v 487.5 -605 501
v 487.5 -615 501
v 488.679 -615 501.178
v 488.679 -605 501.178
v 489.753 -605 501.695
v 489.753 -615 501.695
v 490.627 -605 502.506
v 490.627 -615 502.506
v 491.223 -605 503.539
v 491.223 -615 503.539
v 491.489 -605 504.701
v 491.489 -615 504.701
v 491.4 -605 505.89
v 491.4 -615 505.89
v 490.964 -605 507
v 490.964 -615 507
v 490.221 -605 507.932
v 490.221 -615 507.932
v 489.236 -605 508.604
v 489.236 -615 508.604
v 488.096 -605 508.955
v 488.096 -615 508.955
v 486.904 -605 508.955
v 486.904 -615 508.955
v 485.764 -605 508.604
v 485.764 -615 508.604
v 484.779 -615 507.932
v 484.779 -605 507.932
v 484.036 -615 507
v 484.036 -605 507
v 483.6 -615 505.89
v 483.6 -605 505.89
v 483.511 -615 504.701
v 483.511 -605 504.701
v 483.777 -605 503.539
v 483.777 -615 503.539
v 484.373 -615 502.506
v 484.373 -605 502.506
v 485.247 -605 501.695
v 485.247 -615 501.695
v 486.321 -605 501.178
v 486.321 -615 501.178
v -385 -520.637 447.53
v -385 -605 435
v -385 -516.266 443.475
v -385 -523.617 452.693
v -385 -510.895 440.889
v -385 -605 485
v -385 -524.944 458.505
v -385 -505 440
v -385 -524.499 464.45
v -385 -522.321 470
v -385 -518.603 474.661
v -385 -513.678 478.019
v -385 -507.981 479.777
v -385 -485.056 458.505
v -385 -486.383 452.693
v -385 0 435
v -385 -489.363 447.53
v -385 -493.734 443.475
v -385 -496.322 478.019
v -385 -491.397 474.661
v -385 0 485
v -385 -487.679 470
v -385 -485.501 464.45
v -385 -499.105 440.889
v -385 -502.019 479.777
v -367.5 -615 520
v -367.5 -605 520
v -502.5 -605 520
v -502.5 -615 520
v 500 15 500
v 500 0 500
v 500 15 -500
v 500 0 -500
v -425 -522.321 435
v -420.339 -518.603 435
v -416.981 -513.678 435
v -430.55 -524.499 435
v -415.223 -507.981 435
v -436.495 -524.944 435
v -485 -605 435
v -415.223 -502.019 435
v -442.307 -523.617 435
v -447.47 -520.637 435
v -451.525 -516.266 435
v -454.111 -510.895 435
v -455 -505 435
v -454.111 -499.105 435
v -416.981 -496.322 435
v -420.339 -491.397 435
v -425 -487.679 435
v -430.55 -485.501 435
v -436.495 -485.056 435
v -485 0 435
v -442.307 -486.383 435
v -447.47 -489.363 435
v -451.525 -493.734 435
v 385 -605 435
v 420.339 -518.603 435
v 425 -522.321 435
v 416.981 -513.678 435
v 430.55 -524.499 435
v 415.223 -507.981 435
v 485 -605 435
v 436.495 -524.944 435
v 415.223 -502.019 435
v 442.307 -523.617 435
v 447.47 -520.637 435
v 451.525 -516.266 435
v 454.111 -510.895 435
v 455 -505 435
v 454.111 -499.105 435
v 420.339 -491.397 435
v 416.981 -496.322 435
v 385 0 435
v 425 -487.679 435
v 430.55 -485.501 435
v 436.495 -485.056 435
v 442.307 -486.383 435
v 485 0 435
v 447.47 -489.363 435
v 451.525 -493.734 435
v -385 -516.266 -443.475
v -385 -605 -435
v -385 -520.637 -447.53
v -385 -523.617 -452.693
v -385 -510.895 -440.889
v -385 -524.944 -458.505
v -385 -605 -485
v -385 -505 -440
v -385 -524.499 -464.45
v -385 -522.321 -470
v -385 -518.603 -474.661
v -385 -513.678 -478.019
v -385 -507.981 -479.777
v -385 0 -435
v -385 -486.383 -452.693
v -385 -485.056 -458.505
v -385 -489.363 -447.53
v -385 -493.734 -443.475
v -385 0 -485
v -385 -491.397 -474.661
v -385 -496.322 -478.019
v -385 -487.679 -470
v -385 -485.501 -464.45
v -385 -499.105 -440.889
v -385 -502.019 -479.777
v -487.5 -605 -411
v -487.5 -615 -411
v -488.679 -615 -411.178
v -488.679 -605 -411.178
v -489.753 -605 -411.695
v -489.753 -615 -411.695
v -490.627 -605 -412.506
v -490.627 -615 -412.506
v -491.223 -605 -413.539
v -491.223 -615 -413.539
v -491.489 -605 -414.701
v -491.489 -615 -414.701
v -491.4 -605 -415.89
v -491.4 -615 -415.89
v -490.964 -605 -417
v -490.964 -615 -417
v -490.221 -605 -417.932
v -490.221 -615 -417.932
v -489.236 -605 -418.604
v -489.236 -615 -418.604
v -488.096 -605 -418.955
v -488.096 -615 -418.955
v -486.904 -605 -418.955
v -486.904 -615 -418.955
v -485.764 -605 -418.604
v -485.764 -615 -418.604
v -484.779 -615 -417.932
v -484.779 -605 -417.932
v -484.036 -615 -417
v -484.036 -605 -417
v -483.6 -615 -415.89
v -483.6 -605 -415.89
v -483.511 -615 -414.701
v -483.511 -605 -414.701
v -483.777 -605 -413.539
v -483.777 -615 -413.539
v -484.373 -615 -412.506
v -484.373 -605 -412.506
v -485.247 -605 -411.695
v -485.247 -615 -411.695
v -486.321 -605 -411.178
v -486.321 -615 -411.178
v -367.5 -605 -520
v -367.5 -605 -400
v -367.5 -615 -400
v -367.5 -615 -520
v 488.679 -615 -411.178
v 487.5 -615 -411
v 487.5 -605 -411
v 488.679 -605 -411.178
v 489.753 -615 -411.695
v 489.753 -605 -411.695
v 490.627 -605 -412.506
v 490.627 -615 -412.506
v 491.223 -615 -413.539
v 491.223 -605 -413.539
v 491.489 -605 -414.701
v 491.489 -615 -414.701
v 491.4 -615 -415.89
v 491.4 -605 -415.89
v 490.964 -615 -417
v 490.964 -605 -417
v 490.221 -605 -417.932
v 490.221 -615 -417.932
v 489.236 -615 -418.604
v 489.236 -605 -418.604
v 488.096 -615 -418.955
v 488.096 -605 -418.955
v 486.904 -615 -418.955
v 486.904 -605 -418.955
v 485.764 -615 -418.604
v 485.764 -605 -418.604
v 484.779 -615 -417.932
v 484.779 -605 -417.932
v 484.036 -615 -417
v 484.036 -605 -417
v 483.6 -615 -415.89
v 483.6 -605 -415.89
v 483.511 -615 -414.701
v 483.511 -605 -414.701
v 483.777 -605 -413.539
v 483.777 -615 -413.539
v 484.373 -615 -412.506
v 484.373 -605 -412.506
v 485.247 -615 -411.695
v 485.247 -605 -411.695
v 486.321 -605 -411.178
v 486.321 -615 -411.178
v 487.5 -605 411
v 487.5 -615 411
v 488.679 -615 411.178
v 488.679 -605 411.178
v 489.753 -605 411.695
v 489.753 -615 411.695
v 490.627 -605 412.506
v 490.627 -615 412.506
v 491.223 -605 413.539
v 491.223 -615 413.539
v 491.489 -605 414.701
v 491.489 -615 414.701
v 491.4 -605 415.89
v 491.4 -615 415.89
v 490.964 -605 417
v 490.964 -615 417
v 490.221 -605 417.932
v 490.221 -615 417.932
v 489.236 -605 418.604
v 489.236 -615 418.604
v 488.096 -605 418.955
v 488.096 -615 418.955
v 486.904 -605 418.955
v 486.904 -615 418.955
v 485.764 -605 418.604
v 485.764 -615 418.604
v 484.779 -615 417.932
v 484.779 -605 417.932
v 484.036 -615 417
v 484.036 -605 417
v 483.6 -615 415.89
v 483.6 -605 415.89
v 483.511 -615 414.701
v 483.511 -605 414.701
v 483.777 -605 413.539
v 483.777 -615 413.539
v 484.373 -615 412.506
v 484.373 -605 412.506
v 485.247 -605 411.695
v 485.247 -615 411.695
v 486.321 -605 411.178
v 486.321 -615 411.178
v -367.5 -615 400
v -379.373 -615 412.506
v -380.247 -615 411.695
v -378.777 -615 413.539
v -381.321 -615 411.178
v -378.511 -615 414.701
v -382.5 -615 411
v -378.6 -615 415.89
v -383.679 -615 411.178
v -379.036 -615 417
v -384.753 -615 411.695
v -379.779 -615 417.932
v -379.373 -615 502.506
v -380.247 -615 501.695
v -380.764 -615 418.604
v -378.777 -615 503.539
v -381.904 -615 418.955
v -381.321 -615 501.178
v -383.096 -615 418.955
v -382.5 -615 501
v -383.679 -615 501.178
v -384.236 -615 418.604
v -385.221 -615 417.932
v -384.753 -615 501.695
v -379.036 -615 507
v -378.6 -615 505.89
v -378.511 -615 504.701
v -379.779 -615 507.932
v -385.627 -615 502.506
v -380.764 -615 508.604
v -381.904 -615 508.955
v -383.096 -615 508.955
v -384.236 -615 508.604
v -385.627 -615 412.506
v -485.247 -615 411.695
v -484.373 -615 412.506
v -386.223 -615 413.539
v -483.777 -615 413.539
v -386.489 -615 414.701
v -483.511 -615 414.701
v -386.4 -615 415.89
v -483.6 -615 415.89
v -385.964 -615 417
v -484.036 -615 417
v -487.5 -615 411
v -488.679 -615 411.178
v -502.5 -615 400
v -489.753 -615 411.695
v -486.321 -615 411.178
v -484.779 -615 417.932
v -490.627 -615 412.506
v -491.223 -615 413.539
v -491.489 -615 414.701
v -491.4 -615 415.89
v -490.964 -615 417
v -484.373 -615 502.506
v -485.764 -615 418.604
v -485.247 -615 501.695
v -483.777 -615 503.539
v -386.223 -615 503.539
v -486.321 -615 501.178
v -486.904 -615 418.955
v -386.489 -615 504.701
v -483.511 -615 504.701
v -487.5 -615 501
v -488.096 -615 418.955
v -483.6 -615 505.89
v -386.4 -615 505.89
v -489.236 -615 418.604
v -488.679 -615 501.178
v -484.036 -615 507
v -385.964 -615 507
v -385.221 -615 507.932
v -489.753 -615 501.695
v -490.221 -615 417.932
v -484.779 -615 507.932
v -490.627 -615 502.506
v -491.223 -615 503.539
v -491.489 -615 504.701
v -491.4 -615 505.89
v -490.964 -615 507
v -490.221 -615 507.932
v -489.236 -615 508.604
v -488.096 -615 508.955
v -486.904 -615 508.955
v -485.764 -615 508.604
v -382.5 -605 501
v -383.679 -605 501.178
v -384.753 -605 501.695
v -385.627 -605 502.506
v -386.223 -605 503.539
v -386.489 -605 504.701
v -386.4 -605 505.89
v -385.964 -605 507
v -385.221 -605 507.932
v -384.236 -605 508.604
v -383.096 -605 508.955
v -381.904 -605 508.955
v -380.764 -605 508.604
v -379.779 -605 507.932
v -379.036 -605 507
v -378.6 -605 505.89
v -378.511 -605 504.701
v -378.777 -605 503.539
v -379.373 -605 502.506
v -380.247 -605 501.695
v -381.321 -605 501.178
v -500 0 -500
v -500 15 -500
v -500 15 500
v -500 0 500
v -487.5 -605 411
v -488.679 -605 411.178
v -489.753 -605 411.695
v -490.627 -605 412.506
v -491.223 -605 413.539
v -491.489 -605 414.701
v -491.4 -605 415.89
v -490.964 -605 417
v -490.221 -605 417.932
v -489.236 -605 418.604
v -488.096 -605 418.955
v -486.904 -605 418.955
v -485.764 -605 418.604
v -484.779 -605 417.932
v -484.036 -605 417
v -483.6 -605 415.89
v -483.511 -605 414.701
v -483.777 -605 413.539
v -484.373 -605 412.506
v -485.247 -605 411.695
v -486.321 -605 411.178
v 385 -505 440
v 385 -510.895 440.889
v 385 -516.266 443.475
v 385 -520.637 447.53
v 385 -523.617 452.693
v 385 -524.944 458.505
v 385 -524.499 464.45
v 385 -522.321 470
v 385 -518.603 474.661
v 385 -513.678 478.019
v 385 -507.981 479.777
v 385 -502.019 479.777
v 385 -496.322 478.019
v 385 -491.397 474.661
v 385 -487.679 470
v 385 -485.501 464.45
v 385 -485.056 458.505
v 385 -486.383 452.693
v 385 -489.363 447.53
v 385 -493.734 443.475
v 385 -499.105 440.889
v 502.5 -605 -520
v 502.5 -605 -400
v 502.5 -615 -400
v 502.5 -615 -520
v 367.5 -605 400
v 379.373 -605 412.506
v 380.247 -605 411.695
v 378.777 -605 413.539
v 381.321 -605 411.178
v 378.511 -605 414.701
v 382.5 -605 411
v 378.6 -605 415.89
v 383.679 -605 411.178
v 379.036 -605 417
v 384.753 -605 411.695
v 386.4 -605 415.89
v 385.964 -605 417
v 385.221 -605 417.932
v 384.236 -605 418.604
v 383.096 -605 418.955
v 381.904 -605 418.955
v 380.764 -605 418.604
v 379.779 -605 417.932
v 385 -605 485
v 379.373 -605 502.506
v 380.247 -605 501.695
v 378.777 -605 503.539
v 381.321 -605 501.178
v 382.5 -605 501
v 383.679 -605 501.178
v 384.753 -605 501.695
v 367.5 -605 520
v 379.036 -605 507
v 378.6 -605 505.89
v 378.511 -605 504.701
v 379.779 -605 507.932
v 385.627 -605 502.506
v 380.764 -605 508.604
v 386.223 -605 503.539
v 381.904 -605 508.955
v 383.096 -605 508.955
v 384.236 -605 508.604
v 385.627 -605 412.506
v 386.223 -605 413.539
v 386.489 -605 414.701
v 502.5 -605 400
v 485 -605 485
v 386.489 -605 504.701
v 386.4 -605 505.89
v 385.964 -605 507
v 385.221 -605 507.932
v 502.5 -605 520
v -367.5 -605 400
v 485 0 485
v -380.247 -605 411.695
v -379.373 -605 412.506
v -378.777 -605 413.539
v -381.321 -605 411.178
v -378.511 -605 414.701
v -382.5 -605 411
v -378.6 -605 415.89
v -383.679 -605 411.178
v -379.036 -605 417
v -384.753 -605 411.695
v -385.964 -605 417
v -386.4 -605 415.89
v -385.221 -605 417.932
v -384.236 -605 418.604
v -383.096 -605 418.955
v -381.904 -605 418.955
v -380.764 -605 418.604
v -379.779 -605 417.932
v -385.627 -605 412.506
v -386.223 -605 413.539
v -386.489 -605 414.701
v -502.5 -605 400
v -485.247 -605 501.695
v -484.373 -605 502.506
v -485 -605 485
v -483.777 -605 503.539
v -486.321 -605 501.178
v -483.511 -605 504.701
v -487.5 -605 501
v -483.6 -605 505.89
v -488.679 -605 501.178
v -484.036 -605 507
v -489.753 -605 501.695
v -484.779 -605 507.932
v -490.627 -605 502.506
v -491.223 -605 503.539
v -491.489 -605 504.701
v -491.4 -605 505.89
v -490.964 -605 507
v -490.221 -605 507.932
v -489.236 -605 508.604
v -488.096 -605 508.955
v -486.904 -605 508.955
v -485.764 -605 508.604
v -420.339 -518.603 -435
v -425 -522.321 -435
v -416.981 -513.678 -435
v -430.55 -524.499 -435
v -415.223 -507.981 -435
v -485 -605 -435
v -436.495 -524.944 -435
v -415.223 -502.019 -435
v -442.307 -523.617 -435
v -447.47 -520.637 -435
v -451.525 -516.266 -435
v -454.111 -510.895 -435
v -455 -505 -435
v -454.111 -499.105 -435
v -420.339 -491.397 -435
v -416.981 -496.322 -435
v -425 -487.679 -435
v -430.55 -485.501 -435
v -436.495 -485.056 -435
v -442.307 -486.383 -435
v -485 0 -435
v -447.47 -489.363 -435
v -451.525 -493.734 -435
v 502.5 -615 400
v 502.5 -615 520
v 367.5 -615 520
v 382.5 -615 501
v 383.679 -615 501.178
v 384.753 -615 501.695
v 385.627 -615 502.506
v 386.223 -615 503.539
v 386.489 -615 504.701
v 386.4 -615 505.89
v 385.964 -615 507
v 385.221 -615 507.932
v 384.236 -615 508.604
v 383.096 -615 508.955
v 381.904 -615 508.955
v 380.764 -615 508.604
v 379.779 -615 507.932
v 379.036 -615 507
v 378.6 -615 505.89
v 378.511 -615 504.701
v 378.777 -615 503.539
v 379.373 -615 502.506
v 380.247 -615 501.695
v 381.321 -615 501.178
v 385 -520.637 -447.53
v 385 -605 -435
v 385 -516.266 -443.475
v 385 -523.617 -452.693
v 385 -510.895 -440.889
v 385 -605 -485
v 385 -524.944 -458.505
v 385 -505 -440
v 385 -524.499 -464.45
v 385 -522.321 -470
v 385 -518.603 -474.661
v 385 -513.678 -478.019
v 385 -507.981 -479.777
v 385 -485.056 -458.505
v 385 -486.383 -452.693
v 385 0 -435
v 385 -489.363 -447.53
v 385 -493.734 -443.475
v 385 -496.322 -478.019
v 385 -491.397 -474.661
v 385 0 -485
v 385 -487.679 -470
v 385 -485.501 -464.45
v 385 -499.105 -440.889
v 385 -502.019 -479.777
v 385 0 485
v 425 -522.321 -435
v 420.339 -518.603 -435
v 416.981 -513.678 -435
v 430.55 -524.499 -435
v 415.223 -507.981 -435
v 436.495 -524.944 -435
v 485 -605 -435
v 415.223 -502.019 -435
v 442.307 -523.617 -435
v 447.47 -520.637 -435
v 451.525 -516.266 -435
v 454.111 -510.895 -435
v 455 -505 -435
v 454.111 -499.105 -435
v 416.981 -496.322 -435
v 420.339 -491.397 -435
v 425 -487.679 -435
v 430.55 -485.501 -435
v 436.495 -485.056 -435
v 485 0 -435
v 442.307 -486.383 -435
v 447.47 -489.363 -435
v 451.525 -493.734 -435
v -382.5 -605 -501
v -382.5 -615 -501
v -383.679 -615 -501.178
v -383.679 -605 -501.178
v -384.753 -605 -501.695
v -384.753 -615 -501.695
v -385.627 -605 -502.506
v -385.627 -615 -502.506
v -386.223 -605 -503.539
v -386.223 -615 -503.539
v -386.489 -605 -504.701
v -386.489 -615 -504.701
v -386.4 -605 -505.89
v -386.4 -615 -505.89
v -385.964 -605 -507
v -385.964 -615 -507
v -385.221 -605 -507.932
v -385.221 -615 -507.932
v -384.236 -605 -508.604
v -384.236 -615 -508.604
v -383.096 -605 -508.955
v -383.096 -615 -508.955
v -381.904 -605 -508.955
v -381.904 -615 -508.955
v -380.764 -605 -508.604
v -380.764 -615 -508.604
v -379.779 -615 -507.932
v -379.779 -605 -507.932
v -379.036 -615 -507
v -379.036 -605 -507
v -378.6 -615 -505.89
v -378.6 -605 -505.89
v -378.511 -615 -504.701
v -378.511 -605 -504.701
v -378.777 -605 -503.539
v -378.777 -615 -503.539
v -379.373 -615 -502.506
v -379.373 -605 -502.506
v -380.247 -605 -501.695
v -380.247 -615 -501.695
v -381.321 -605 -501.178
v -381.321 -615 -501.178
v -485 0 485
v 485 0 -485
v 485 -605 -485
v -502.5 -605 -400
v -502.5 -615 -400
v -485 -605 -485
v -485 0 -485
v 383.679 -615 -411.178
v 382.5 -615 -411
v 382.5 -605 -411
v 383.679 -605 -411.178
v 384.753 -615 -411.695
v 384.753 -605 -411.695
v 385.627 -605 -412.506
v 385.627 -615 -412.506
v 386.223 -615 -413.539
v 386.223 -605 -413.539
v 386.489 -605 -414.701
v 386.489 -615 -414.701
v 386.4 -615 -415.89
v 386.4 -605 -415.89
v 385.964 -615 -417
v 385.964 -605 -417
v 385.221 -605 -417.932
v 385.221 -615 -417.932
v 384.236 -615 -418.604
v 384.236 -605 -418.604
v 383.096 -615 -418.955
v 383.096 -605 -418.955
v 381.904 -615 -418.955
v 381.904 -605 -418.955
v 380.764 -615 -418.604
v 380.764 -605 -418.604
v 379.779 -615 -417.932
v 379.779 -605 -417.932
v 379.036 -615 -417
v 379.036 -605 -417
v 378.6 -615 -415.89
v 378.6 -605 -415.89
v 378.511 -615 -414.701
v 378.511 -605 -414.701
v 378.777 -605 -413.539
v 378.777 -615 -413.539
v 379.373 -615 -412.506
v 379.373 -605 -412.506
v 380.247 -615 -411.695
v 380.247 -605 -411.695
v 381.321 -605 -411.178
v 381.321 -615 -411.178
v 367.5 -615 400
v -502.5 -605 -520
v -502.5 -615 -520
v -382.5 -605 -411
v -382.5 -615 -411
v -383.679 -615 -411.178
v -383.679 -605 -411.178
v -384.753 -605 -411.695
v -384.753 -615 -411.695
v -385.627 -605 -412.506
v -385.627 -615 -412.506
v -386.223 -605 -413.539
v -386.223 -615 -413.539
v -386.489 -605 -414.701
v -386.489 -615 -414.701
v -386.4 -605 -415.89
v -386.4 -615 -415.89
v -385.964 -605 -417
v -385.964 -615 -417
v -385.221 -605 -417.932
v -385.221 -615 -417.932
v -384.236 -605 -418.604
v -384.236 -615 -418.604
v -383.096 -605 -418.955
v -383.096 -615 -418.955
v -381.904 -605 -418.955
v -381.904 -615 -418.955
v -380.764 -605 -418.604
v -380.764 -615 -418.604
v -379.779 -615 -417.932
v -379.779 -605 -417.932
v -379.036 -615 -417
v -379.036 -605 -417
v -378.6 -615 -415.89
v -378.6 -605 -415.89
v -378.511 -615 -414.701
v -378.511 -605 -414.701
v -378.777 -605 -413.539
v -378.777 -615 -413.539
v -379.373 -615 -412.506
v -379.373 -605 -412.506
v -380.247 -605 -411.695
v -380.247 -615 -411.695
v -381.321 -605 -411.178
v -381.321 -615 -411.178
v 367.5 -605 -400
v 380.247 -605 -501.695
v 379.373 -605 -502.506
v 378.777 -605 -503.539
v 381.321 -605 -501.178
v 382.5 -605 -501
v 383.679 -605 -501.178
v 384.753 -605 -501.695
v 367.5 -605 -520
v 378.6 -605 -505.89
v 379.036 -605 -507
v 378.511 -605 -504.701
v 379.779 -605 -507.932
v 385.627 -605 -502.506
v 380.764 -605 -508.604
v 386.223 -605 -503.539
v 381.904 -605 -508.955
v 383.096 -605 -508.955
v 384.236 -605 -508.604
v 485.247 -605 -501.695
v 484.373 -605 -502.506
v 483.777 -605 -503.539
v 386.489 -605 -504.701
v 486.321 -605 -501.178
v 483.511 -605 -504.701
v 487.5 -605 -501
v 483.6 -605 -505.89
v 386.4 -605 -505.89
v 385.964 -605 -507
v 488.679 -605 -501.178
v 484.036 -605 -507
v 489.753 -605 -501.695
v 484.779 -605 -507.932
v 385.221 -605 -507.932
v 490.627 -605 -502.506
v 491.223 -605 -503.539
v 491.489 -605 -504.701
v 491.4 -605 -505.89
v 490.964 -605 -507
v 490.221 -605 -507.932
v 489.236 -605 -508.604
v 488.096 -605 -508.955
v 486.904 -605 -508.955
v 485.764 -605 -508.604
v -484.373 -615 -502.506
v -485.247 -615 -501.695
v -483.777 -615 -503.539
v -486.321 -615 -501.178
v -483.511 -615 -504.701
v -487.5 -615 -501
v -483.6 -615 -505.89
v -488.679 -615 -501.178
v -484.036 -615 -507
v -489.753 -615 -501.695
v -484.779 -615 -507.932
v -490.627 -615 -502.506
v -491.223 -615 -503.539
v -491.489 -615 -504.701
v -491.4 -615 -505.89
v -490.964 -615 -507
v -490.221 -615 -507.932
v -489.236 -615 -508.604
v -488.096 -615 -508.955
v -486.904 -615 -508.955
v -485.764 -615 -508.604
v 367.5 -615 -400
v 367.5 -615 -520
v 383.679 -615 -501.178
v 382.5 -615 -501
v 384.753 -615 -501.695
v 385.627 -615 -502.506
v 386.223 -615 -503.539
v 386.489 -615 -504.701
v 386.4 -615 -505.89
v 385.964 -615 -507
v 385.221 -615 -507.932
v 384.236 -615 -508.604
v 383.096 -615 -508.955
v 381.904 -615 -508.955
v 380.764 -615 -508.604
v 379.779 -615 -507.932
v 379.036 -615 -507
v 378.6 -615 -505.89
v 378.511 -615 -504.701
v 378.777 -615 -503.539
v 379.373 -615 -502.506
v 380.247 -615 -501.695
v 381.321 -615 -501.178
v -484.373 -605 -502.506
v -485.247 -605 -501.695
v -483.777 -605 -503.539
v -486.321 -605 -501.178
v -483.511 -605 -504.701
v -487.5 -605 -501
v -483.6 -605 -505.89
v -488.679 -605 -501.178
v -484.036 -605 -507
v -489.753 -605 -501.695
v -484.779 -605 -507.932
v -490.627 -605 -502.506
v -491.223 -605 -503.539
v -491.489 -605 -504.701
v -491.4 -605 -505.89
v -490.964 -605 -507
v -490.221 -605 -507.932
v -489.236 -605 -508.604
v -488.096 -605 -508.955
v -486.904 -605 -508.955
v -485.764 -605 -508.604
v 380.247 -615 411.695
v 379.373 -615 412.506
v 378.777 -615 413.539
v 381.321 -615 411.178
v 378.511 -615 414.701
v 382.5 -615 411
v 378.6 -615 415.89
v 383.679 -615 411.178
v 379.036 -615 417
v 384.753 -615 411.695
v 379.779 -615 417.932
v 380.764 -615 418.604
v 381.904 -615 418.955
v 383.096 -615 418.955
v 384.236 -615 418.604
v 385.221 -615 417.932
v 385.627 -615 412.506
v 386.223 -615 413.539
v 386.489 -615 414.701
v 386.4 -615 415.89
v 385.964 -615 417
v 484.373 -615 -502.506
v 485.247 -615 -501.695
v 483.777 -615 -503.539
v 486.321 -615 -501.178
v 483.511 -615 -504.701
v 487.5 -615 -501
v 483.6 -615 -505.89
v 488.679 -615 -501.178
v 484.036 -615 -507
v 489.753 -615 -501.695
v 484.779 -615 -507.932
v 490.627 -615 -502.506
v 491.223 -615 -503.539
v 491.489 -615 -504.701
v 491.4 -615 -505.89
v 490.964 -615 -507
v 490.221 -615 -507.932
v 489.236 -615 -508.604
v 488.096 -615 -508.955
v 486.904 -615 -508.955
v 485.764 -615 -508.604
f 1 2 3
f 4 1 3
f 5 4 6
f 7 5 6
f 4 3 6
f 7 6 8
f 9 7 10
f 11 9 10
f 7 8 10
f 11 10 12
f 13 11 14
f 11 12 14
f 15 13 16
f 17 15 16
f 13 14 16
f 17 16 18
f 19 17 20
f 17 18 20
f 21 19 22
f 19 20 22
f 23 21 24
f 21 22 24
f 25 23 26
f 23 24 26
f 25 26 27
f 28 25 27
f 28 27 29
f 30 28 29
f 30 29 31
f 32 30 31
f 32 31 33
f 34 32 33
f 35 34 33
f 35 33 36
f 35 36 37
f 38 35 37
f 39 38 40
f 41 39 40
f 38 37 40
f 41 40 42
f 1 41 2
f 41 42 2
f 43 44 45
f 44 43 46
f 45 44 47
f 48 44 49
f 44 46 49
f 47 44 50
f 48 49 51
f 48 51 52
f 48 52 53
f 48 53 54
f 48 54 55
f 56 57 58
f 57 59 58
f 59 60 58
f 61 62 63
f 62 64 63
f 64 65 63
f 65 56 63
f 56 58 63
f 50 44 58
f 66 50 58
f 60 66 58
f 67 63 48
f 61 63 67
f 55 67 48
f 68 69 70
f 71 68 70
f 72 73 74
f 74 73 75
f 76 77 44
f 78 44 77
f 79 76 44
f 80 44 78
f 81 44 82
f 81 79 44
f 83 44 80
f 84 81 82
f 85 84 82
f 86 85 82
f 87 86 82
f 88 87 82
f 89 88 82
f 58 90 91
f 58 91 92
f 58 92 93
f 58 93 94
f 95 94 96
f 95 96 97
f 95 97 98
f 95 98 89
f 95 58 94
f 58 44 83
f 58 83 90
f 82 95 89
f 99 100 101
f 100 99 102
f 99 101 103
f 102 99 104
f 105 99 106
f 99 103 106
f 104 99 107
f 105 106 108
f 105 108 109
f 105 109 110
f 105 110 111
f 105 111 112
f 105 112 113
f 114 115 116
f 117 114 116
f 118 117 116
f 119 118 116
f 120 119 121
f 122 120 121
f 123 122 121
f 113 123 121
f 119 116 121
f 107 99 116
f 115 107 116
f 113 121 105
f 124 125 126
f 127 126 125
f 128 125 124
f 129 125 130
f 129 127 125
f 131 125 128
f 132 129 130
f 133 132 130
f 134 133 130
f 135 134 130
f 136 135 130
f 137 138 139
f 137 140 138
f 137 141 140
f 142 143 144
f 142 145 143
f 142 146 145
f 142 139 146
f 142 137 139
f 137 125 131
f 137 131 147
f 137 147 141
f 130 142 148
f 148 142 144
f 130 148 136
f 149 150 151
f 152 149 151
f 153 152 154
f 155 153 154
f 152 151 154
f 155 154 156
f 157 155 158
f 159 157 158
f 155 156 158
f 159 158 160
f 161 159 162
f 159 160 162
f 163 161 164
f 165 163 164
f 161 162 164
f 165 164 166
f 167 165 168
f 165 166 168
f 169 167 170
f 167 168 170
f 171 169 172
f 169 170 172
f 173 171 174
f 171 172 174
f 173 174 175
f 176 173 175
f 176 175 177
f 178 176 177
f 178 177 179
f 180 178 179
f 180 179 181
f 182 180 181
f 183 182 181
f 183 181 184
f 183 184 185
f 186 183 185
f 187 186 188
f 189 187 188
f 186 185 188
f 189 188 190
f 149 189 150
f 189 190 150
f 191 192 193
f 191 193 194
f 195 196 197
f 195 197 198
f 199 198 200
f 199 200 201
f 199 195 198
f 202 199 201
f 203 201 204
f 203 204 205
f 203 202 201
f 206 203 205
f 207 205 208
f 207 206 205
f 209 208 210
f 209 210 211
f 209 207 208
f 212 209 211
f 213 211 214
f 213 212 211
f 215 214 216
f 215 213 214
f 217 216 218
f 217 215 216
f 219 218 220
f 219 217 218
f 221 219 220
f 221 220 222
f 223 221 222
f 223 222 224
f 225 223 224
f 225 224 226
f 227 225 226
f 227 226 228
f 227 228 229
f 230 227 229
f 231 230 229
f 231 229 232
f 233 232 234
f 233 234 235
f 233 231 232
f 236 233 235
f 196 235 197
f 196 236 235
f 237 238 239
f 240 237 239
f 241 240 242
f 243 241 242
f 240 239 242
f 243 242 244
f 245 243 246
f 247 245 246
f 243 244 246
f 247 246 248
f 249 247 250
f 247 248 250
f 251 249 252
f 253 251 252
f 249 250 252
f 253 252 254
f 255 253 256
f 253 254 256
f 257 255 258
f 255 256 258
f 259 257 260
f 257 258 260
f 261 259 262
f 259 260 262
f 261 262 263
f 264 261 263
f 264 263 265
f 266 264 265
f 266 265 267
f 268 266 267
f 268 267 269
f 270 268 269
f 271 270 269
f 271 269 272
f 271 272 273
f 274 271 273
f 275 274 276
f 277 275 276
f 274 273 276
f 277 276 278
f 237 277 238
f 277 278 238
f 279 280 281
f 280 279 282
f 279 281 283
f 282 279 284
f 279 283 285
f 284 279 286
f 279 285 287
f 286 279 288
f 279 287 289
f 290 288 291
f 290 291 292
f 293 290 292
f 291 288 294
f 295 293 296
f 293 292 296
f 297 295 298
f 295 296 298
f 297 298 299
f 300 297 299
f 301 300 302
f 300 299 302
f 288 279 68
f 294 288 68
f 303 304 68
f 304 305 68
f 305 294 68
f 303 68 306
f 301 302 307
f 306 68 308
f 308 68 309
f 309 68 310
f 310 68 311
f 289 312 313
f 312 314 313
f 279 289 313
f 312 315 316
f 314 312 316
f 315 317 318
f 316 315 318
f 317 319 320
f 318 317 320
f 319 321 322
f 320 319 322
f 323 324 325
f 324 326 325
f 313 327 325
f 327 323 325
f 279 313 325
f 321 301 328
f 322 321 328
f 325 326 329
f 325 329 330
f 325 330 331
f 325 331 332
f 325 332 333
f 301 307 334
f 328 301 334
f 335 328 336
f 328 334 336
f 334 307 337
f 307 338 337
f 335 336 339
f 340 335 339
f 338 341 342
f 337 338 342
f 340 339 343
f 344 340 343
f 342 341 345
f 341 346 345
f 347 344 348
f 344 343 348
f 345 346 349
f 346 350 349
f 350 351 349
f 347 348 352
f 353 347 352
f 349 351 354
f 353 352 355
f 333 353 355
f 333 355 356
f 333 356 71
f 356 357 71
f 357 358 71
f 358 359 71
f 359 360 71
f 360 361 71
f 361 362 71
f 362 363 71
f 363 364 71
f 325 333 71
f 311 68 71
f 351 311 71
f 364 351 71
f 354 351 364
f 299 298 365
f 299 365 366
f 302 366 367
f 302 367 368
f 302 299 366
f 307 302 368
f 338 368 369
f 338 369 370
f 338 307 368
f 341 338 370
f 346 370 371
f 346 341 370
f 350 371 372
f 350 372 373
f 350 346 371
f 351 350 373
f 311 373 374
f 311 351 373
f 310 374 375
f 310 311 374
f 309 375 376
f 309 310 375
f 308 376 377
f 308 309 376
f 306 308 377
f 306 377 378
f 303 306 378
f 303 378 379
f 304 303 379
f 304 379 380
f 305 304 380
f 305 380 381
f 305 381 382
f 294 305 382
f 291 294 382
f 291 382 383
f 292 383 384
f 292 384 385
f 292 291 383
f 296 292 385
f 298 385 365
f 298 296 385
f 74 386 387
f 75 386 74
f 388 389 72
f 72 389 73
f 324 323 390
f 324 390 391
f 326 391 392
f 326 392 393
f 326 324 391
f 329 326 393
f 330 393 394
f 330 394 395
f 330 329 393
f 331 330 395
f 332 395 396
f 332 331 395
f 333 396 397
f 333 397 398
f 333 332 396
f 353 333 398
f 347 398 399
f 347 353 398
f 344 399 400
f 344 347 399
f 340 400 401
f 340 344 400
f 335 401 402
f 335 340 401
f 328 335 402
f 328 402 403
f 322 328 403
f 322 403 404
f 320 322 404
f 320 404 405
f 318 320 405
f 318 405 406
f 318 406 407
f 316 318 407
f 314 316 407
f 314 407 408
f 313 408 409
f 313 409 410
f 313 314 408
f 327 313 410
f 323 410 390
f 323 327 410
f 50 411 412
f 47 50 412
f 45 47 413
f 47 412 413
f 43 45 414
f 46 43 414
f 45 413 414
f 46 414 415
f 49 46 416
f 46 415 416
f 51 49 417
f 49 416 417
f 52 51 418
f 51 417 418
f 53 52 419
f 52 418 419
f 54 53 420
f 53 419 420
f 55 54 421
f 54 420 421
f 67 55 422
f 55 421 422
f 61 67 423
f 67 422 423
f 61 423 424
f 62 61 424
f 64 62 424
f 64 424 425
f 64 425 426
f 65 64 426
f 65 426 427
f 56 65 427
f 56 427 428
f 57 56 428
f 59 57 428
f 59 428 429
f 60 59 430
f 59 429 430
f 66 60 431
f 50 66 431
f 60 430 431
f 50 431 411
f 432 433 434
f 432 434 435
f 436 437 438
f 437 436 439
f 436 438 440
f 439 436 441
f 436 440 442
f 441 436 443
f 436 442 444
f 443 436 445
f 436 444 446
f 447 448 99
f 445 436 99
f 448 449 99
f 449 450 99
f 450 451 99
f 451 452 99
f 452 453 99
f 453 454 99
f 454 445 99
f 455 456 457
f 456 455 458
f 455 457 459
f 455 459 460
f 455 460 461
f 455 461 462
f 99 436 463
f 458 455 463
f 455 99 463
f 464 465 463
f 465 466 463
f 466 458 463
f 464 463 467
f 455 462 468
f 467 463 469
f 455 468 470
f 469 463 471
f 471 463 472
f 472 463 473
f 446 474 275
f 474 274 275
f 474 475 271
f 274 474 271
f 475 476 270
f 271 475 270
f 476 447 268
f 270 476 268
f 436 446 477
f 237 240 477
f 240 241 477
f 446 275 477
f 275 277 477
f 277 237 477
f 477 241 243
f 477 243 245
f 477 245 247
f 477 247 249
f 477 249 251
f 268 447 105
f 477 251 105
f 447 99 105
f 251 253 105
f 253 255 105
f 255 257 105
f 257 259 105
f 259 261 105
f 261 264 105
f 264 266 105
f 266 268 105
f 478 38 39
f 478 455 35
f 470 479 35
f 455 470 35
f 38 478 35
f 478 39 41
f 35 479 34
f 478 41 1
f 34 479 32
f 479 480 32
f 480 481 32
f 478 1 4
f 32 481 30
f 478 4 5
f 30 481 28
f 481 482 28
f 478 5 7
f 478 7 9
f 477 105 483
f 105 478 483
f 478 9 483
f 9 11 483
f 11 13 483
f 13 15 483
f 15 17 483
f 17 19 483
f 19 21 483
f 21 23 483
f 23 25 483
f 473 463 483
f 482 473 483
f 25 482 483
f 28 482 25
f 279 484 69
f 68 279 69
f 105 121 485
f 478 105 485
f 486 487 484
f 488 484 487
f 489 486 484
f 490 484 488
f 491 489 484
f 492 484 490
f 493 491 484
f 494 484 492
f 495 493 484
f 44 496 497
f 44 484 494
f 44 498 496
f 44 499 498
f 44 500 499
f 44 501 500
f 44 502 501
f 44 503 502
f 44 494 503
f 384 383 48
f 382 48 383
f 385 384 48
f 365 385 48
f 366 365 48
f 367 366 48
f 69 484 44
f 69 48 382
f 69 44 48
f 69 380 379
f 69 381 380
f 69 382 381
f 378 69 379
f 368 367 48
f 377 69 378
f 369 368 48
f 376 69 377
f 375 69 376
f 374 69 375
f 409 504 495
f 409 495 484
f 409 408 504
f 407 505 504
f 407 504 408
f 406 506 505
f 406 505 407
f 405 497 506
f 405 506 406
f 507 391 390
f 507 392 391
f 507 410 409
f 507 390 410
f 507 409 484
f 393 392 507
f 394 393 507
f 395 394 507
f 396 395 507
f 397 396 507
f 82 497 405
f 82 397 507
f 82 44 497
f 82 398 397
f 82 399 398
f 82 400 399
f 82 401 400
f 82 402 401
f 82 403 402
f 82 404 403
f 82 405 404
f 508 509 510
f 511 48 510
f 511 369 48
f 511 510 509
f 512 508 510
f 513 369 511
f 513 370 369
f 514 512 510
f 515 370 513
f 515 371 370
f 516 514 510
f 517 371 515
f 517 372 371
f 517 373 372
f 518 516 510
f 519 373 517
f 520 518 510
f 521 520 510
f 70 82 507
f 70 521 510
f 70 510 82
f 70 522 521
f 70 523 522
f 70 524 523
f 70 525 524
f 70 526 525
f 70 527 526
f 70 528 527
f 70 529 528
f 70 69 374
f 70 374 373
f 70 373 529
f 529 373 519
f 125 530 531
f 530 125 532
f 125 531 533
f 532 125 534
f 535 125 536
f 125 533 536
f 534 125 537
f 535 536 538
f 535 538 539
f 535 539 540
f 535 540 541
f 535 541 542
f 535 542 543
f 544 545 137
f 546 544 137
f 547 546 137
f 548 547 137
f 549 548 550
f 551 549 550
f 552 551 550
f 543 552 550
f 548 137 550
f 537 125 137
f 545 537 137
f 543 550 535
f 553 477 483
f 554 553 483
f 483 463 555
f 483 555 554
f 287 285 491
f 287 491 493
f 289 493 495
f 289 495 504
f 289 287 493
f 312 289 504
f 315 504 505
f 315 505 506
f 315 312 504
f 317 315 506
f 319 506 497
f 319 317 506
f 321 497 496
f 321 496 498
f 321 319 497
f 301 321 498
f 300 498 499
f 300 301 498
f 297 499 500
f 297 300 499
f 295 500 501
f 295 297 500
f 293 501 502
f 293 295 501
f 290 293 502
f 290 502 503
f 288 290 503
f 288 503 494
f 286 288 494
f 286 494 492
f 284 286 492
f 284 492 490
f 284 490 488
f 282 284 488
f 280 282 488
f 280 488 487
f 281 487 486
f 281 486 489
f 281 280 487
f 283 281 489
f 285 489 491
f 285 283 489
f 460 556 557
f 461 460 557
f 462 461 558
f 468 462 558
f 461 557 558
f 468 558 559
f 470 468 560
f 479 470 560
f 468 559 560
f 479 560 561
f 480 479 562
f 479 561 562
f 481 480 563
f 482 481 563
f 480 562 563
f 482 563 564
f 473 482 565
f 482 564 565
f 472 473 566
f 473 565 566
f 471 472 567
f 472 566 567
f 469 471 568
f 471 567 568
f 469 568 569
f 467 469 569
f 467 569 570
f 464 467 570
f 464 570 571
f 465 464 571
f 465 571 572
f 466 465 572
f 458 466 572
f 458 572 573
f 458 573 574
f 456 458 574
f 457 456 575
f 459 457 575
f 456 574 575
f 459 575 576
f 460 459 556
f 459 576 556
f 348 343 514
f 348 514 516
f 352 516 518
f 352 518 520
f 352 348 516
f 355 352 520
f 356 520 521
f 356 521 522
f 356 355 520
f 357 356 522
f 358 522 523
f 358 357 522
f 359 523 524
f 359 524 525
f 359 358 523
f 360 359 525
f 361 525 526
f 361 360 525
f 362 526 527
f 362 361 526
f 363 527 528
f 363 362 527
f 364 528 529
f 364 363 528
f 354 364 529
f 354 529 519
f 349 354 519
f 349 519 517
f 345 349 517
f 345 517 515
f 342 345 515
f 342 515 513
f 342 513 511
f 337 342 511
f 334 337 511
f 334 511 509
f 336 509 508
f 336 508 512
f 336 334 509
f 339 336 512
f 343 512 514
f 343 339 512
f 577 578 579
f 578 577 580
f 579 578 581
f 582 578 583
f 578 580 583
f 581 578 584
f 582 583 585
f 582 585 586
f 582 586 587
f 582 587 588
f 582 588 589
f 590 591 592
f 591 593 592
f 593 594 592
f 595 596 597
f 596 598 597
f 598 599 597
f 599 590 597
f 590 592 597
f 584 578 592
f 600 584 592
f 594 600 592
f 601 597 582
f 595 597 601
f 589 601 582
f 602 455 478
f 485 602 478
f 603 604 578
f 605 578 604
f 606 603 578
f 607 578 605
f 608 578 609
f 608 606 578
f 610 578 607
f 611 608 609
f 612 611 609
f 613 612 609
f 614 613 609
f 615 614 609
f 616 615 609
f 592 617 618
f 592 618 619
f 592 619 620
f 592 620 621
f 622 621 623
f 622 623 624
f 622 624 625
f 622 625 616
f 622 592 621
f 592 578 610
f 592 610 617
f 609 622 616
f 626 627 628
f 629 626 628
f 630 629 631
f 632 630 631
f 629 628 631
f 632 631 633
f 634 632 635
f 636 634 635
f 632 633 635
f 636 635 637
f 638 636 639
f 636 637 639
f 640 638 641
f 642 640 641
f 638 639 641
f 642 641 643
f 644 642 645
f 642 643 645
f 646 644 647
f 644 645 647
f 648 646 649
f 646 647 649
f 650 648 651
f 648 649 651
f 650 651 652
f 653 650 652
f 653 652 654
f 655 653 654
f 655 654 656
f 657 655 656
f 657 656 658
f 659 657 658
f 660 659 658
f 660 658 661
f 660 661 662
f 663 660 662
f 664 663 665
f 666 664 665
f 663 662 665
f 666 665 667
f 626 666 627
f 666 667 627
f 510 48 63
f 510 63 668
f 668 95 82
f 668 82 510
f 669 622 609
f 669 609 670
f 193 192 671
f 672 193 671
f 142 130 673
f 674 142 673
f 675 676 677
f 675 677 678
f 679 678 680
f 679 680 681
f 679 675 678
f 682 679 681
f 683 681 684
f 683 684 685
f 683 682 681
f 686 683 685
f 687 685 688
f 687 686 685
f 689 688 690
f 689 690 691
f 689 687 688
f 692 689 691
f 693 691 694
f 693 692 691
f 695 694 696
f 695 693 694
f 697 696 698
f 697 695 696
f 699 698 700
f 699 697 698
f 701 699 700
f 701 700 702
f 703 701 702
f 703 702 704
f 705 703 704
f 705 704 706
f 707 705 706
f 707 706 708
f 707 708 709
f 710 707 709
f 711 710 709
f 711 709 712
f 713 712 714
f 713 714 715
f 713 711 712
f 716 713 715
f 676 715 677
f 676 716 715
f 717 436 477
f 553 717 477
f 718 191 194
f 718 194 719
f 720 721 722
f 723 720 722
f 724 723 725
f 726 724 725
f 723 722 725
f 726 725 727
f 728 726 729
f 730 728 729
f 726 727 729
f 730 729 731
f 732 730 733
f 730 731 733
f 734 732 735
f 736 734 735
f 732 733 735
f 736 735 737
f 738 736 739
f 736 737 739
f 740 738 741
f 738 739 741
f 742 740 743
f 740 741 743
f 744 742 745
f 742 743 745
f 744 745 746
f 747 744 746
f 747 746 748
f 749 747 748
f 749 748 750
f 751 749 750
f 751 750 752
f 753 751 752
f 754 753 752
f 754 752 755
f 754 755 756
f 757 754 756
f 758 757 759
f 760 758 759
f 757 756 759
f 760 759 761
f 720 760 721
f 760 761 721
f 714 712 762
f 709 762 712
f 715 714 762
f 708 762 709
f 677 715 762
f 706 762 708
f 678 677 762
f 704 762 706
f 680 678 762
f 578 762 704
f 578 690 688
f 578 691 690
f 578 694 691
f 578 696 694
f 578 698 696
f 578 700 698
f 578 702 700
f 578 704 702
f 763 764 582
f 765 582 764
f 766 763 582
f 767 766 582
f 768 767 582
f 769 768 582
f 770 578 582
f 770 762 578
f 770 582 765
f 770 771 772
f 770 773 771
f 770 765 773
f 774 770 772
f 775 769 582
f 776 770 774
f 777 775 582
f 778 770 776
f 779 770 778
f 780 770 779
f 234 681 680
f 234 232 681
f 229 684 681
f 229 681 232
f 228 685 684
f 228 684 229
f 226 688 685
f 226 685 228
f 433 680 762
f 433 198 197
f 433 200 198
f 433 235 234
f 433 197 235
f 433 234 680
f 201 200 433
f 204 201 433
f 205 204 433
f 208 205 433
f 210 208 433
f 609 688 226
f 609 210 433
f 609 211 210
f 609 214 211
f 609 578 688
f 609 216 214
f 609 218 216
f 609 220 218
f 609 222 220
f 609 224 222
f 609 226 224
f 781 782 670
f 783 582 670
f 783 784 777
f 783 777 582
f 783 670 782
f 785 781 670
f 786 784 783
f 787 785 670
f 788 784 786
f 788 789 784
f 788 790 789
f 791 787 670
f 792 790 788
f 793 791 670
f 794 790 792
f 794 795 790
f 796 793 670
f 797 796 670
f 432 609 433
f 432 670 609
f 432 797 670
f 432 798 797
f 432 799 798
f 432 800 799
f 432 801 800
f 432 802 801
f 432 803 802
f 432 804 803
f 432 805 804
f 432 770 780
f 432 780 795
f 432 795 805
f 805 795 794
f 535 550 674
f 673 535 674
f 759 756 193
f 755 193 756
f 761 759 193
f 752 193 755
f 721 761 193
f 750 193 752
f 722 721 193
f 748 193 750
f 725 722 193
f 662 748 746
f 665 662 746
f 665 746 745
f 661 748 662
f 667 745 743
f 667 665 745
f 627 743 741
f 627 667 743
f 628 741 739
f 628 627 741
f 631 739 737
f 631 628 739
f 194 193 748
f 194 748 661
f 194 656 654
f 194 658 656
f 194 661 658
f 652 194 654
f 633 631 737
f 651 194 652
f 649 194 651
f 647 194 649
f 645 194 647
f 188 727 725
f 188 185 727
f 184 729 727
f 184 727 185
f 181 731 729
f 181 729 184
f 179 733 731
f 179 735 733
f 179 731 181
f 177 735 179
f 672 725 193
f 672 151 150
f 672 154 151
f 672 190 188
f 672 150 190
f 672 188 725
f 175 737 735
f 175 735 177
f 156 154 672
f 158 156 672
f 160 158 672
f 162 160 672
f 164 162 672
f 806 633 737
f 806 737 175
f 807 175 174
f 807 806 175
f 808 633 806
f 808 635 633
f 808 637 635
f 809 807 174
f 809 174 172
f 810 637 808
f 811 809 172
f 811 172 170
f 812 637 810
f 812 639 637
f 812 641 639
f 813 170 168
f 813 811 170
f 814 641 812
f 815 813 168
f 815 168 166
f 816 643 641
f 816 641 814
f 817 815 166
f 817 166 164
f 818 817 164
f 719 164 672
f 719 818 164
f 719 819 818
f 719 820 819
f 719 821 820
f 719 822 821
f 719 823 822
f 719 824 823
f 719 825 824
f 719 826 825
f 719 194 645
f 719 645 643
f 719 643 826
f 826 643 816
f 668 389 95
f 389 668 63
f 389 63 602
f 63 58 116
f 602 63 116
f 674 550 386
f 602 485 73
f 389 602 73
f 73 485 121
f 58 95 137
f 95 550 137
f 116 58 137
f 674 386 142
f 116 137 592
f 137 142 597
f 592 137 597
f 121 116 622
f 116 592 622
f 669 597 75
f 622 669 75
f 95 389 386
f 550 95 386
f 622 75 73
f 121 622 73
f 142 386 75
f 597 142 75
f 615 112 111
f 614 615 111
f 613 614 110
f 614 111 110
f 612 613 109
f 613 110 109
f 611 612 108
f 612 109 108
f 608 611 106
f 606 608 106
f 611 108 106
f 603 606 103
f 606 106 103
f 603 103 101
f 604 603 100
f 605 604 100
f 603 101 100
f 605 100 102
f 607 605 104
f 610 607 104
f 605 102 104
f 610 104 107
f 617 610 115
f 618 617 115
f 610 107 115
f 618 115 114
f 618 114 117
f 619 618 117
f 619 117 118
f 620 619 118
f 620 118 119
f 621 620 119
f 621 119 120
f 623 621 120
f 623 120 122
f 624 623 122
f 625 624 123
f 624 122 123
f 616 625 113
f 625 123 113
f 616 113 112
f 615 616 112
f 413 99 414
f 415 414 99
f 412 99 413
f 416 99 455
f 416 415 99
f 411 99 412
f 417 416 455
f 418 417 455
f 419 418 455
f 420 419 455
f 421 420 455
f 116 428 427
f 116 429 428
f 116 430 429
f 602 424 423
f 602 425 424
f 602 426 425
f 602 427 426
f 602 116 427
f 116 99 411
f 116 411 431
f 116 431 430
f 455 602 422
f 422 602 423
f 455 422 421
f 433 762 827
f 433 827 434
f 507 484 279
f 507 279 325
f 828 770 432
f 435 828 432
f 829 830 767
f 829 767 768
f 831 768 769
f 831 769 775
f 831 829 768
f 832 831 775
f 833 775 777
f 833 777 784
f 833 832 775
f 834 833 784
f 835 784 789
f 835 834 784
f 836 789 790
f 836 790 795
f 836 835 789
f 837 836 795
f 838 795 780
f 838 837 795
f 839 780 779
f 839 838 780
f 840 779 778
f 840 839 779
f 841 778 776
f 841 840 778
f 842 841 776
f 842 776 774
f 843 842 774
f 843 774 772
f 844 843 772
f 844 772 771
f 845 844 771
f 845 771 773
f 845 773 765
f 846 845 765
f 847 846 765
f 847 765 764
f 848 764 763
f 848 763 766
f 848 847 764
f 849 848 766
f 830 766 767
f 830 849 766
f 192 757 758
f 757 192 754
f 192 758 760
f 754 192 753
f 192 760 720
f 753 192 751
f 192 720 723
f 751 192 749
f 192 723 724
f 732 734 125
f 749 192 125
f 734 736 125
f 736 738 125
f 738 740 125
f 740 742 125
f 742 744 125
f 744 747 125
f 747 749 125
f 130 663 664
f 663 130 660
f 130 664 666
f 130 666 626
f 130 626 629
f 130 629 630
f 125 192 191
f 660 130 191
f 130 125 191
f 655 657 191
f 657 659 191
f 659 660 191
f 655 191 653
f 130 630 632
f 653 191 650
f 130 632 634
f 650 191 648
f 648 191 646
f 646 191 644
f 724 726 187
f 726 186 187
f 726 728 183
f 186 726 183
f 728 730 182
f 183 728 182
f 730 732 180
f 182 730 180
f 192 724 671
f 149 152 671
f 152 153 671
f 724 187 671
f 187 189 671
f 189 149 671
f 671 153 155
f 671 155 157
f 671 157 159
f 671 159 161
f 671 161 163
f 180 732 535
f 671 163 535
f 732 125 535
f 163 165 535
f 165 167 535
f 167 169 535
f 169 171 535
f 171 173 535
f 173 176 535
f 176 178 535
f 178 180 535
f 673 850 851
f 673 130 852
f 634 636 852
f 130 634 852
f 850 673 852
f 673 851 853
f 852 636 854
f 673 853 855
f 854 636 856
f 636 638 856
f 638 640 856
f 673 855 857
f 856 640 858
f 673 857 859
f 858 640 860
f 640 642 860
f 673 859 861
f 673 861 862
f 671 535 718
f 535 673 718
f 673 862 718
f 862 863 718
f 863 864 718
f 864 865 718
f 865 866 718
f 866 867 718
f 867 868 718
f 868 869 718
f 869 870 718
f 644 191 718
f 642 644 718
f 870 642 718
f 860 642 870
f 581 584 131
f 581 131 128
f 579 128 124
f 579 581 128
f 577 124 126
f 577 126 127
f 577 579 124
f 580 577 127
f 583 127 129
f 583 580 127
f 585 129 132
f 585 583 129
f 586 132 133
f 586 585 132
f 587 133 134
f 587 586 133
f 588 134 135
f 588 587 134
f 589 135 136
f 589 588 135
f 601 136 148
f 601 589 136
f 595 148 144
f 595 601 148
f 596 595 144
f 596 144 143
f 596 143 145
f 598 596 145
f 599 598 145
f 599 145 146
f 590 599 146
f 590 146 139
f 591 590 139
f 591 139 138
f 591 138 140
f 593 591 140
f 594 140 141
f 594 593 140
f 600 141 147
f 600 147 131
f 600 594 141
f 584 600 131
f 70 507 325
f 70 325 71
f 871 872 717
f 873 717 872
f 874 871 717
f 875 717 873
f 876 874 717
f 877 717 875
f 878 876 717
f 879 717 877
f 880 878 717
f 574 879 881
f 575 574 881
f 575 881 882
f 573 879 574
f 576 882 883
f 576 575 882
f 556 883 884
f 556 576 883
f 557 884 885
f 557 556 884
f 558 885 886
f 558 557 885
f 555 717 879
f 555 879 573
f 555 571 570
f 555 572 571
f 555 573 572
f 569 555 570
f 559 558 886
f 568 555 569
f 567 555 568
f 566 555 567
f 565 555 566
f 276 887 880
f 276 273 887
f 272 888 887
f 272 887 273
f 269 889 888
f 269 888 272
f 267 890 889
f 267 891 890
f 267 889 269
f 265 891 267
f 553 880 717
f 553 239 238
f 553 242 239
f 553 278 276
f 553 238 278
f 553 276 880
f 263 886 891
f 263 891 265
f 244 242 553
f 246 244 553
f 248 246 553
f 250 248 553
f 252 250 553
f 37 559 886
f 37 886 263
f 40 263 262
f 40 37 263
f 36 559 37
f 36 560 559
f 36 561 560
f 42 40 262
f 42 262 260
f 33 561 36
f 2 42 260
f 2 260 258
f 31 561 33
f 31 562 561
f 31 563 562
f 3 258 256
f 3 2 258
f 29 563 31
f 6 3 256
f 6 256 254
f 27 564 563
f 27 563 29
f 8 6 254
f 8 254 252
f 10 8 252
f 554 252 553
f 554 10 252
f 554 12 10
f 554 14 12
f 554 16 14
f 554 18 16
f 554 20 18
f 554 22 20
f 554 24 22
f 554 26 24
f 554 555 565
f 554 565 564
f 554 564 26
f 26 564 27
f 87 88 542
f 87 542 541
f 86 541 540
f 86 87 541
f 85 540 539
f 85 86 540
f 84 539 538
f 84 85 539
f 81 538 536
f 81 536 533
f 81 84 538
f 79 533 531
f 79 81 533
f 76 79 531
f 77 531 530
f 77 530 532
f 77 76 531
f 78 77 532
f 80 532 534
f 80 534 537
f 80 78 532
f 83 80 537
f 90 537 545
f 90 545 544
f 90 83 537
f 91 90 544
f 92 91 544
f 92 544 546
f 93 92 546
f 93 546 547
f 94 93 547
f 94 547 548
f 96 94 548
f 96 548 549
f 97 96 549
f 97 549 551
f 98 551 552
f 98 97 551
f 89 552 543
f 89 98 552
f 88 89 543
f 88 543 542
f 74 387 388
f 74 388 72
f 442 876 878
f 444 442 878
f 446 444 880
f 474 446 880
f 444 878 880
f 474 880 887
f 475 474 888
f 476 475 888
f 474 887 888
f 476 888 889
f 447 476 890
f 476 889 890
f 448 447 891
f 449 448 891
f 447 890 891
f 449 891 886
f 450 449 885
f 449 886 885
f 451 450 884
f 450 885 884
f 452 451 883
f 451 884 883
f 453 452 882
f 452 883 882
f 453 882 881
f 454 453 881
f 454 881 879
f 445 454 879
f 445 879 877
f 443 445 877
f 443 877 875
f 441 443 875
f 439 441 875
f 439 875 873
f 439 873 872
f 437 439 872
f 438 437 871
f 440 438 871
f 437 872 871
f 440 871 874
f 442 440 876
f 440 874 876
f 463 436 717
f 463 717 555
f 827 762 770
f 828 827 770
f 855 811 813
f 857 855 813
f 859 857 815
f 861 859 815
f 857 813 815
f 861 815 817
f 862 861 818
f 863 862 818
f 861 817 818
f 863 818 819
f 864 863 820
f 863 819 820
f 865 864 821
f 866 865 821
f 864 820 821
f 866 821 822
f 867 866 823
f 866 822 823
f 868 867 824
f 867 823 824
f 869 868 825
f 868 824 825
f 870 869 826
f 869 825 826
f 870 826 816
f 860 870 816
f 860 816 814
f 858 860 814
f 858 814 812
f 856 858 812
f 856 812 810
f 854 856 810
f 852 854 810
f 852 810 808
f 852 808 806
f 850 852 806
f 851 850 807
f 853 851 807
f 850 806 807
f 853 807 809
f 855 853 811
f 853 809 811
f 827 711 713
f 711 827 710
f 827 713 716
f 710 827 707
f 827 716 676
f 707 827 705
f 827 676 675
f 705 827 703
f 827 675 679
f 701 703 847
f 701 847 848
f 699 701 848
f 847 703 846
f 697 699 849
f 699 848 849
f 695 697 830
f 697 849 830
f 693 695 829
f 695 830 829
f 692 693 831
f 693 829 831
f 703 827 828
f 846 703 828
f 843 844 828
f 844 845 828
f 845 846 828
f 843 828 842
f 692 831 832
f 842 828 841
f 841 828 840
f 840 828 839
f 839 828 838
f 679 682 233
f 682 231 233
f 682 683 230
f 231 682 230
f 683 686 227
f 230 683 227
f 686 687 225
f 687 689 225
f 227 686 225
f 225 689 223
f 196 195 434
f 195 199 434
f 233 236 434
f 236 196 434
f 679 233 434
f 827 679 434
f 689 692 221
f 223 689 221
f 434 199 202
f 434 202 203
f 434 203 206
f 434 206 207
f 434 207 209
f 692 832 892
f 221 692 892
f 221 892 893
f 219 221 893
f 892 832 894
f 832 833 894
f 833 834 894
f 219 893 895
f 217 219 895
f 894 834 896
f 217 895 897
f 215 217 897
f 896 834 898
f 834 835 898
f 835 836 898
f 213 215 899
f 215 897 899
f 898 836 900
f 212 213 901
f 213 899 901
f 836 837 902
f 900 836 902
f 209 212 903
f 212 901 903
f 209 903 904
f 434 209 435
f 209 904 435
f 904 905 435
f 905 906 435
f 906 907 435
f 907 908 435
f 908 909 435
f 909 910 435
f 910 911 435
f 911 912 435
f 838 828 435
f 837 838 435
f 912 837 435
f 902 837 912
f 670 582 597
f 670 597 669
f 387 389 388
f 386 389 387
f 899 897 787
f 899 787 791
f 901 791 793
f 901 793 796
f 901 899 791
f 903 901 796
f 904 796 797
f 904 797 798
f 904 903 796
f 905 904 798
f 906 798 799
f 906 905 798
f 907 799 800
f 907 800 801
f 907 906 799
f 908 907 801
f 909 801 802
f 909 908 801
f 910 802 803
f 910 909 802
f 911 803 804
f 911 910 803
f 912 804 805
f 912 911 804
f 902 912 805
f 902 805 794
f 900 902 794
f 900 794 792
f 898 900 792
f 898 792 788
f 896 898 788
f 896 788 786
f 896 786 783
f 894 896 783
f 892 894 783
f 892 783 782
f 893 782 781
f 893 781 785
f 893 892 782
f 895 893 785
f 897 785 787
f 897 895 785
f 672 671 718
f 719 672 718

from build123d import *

# Parameters (mm, degrees)
SKETCH1_W               = 1000
SKETCH1_H               = 1000
BOSS_EXTRUDE1_DEPTH     = 15
SKETCH2_W               = 100
SKETCH2_H               = 50
BOSS_EXTRUDE2_DEPTH     = 605
SKETCH3_W               = 135
SKETCH3_H               = 120
BOSS_EXTRUDE3_DEPTH     = 10
SKETCH5_R               = 4
CUT_EXTRUDE1_DEPTH      = 10
MIRROR2_COPY_1_SKETCH_W = 100
MIRROR2_COPY_1_SKETCH_H = 50
MIRROR2_COPY_1_DEPTH    = 605
MIRROR2_COPY_2_SKETCH_W = 135
MIRROR2_COPY_2_SKETCH_H = 120
MIRROR2_COPY_2_DEPTH    = 10
MIRROR2_COPY_3_SKETCH_R = 4
MIRROR2_COPY_3_DEPTH    = 10
SKETCH6_R               = 20
BOSS_EXTRUDE4_DEPTH     = 870
SKETCH7_R               = 20
BOSS_EXTRUDE5_DEPTH     = 770


with BuildPart() as part:
    # Sketch1 → Boss-Extrude1 (new body)
    with BuildSketch(Plane(origin=(0, 0, 0), x_dir=(1, 0, 0), z_dir=(0, 1, 0))):
        Rectangle(SKETCH1_W, SKETCH1_H)
    extrude(amount=BOSS_EXTRUDE1_DEPTH)

    # Sketch2 → Boss-Extrude2 (add)
    with BuildSketch(Plane.XZ):
        with Locations((435, 460)):
            Rectangle(SKETCH2_W, SKETCH2_H)
    boss_extrude2 = extrude(amount=BOSS_EXTRUDE2_DEPTH)

    # Sketch3 → Boss-Extrude3 (add)
    with BuildSketch(Plane.XZ.offset(605)):
        with Locations((435, 460)):
            Rectangle(SKETCH3_W, SKETCH3_H)
    boss_extrude3 = extrude(amount=BOSS_EXTRUDE3_DEPTH)

    # Sketch5 → Cut-Extrude1 (cut)
    with BuildSketch(Plane.XZ.offset(615)):
        with Locations(Location((382.5, 505, 0), (0, 0, 270))):
            Circle(SKETCH5_R)
        with Locations(Location((382.5, 415, 0), (0, 0, 270))):
            Circle(SKETCH5_R)
        with Locations(Location((487.5, 415, 0), (0, 0, 270))):
            Circle(SKETCH5_R)
        with Locations(Location((487.5, 505, 0), (0, 0, 270))):
            Circle(SKETCH5_R)
    cut_extrude1 = extrude(amount=-CUT_EXTRUDE1_DEPTH, mode=Mode.SUBTRACT)

    # Mirror1: Boss-Extrude2, Boss-Extrude3, Cut-Extrude1 across plane
    add(boss_extrude2.mirror(Plane.XY))
    add(boss_extrude3.mirror(Plane.XY))
    add(cut_extrude1.mirror(Plane.XY), mode=Mode.SUBTRACT)

    # Mirror2: Boss-Extrude2, Boss-Extrude3, Cut-Extrude1 across plane
    add(boss_extrude2.mirror(Plane(origin=(0, 0, 0), x_dir=(0, 0, 1), z_dir=(1, 0, 0))))
    add(boss_extrude3.mirror(Plane(origin=(0, 0, 0), x_dir=(0, 0, 1), z_dir=(1, 0, 0))))
    add(cut_extrude1.mirror(Plane(origin=(0, 0, 0), x_dir=(0, 0, 1), z_dir=(1, 0, 0))), mode=Mode.SUBTRACT)

    # Mirror2 copy 1 sketch → Mirror2 copy 1 (add)
    with BuildSketch(Plane(origin=(0, 0, 0), x_dir=(-1, 0, 0), z_dir=(0, -1, 0))):
        with Locations((435, 460)):
            Rectangle(MIRROR2_COPY_1_SKETCH_W, MIRROR2_COPY_1_SKETCH_H)
    extrude(amount=MIRROR2_COPY_1_DEPTH)

    # Mirror2 copy 2 sketch → Mirror2 copy 2 (add)
    with BuildSketch(Plane(origin=(0, -605, 0), x_dir=(-1, 0, 0), z_dir=(0, -1, 0))):
        with Locations((435, 460)):
            Rectangle(MIRROR2_COPY_2_SKETCH_W, MIRROR2_COPY_2_SKETCH_H)
    extrude(amount=MIRROR2_COPY_2_DEPTH)

    # Mirror2 copy 3 sketch → Mirror2 copy 3 (cut)
    with BuildSketch(Plane(origin=(0, -615, 0), x_dir=(-1, 0, 0), z_dir=(0, -1, 0))):
        with Locations(Location((382.5, 505, 0), (0, 0, 270))):
            Circle(MIRROR2_COPY_3_SKETCH_R)
        with Locations(Location((382.5, 415, 0), (0, 0, 270))):
            Circle(MIRROR2_COPY_3_SKETCH_R)
        with Locations(Location((487.5, 415, 0), (0, 0, 270))):
            Circle(MIRROR2_COPY_3_SKETCH_R)
        with Locations(Location((487.5, 505, 0), (0, 0, 270))):
            Circle(MIRROR2_COPY_3_SKETCH_R)
    extrude(amount=-MIRROR2_COPY_3_DEPTH, mode=Mode.SUBTRACT)

    # Sketch6 → Boss-Extrude4 (add)
    with BuildSketch(Plane(origin=(0, 0, 435), x_dir=(-1, 0, 0), z_dir=(0, 0, -1))):
        with Locations(Location((-435, -505, 0), (0, 0, 180))):
            Circle(SKETCH6_R)
    boss_extrude4 = extrude(amount=BOSS_EXTRUDE4_DEPTH)

    # Sketch7 → Boss-Extrude5 (add)
    with BuildSketch(Plane.ZY.offset(-385)):
        with Locations(Location((460, -505, 0), (0, 0, 180))):
            Circle(SKETCH7_R)
    boss_extrude5 = extrude(amount=BOSS_EXTRUDE5_DEPTH)

    # Mirror3: Boss-Extrude5 across plane
    add(boss_extrude5.mirror(Plane.XY))

    # Mirror4: Boss-Extrude4 across plane
    add(boss_extrude4.mirror(Plane(origin=(0, 0, 0), x_dir=(0, 0, 1), z_dir=(1, 0, 0))))


solid = part.part
